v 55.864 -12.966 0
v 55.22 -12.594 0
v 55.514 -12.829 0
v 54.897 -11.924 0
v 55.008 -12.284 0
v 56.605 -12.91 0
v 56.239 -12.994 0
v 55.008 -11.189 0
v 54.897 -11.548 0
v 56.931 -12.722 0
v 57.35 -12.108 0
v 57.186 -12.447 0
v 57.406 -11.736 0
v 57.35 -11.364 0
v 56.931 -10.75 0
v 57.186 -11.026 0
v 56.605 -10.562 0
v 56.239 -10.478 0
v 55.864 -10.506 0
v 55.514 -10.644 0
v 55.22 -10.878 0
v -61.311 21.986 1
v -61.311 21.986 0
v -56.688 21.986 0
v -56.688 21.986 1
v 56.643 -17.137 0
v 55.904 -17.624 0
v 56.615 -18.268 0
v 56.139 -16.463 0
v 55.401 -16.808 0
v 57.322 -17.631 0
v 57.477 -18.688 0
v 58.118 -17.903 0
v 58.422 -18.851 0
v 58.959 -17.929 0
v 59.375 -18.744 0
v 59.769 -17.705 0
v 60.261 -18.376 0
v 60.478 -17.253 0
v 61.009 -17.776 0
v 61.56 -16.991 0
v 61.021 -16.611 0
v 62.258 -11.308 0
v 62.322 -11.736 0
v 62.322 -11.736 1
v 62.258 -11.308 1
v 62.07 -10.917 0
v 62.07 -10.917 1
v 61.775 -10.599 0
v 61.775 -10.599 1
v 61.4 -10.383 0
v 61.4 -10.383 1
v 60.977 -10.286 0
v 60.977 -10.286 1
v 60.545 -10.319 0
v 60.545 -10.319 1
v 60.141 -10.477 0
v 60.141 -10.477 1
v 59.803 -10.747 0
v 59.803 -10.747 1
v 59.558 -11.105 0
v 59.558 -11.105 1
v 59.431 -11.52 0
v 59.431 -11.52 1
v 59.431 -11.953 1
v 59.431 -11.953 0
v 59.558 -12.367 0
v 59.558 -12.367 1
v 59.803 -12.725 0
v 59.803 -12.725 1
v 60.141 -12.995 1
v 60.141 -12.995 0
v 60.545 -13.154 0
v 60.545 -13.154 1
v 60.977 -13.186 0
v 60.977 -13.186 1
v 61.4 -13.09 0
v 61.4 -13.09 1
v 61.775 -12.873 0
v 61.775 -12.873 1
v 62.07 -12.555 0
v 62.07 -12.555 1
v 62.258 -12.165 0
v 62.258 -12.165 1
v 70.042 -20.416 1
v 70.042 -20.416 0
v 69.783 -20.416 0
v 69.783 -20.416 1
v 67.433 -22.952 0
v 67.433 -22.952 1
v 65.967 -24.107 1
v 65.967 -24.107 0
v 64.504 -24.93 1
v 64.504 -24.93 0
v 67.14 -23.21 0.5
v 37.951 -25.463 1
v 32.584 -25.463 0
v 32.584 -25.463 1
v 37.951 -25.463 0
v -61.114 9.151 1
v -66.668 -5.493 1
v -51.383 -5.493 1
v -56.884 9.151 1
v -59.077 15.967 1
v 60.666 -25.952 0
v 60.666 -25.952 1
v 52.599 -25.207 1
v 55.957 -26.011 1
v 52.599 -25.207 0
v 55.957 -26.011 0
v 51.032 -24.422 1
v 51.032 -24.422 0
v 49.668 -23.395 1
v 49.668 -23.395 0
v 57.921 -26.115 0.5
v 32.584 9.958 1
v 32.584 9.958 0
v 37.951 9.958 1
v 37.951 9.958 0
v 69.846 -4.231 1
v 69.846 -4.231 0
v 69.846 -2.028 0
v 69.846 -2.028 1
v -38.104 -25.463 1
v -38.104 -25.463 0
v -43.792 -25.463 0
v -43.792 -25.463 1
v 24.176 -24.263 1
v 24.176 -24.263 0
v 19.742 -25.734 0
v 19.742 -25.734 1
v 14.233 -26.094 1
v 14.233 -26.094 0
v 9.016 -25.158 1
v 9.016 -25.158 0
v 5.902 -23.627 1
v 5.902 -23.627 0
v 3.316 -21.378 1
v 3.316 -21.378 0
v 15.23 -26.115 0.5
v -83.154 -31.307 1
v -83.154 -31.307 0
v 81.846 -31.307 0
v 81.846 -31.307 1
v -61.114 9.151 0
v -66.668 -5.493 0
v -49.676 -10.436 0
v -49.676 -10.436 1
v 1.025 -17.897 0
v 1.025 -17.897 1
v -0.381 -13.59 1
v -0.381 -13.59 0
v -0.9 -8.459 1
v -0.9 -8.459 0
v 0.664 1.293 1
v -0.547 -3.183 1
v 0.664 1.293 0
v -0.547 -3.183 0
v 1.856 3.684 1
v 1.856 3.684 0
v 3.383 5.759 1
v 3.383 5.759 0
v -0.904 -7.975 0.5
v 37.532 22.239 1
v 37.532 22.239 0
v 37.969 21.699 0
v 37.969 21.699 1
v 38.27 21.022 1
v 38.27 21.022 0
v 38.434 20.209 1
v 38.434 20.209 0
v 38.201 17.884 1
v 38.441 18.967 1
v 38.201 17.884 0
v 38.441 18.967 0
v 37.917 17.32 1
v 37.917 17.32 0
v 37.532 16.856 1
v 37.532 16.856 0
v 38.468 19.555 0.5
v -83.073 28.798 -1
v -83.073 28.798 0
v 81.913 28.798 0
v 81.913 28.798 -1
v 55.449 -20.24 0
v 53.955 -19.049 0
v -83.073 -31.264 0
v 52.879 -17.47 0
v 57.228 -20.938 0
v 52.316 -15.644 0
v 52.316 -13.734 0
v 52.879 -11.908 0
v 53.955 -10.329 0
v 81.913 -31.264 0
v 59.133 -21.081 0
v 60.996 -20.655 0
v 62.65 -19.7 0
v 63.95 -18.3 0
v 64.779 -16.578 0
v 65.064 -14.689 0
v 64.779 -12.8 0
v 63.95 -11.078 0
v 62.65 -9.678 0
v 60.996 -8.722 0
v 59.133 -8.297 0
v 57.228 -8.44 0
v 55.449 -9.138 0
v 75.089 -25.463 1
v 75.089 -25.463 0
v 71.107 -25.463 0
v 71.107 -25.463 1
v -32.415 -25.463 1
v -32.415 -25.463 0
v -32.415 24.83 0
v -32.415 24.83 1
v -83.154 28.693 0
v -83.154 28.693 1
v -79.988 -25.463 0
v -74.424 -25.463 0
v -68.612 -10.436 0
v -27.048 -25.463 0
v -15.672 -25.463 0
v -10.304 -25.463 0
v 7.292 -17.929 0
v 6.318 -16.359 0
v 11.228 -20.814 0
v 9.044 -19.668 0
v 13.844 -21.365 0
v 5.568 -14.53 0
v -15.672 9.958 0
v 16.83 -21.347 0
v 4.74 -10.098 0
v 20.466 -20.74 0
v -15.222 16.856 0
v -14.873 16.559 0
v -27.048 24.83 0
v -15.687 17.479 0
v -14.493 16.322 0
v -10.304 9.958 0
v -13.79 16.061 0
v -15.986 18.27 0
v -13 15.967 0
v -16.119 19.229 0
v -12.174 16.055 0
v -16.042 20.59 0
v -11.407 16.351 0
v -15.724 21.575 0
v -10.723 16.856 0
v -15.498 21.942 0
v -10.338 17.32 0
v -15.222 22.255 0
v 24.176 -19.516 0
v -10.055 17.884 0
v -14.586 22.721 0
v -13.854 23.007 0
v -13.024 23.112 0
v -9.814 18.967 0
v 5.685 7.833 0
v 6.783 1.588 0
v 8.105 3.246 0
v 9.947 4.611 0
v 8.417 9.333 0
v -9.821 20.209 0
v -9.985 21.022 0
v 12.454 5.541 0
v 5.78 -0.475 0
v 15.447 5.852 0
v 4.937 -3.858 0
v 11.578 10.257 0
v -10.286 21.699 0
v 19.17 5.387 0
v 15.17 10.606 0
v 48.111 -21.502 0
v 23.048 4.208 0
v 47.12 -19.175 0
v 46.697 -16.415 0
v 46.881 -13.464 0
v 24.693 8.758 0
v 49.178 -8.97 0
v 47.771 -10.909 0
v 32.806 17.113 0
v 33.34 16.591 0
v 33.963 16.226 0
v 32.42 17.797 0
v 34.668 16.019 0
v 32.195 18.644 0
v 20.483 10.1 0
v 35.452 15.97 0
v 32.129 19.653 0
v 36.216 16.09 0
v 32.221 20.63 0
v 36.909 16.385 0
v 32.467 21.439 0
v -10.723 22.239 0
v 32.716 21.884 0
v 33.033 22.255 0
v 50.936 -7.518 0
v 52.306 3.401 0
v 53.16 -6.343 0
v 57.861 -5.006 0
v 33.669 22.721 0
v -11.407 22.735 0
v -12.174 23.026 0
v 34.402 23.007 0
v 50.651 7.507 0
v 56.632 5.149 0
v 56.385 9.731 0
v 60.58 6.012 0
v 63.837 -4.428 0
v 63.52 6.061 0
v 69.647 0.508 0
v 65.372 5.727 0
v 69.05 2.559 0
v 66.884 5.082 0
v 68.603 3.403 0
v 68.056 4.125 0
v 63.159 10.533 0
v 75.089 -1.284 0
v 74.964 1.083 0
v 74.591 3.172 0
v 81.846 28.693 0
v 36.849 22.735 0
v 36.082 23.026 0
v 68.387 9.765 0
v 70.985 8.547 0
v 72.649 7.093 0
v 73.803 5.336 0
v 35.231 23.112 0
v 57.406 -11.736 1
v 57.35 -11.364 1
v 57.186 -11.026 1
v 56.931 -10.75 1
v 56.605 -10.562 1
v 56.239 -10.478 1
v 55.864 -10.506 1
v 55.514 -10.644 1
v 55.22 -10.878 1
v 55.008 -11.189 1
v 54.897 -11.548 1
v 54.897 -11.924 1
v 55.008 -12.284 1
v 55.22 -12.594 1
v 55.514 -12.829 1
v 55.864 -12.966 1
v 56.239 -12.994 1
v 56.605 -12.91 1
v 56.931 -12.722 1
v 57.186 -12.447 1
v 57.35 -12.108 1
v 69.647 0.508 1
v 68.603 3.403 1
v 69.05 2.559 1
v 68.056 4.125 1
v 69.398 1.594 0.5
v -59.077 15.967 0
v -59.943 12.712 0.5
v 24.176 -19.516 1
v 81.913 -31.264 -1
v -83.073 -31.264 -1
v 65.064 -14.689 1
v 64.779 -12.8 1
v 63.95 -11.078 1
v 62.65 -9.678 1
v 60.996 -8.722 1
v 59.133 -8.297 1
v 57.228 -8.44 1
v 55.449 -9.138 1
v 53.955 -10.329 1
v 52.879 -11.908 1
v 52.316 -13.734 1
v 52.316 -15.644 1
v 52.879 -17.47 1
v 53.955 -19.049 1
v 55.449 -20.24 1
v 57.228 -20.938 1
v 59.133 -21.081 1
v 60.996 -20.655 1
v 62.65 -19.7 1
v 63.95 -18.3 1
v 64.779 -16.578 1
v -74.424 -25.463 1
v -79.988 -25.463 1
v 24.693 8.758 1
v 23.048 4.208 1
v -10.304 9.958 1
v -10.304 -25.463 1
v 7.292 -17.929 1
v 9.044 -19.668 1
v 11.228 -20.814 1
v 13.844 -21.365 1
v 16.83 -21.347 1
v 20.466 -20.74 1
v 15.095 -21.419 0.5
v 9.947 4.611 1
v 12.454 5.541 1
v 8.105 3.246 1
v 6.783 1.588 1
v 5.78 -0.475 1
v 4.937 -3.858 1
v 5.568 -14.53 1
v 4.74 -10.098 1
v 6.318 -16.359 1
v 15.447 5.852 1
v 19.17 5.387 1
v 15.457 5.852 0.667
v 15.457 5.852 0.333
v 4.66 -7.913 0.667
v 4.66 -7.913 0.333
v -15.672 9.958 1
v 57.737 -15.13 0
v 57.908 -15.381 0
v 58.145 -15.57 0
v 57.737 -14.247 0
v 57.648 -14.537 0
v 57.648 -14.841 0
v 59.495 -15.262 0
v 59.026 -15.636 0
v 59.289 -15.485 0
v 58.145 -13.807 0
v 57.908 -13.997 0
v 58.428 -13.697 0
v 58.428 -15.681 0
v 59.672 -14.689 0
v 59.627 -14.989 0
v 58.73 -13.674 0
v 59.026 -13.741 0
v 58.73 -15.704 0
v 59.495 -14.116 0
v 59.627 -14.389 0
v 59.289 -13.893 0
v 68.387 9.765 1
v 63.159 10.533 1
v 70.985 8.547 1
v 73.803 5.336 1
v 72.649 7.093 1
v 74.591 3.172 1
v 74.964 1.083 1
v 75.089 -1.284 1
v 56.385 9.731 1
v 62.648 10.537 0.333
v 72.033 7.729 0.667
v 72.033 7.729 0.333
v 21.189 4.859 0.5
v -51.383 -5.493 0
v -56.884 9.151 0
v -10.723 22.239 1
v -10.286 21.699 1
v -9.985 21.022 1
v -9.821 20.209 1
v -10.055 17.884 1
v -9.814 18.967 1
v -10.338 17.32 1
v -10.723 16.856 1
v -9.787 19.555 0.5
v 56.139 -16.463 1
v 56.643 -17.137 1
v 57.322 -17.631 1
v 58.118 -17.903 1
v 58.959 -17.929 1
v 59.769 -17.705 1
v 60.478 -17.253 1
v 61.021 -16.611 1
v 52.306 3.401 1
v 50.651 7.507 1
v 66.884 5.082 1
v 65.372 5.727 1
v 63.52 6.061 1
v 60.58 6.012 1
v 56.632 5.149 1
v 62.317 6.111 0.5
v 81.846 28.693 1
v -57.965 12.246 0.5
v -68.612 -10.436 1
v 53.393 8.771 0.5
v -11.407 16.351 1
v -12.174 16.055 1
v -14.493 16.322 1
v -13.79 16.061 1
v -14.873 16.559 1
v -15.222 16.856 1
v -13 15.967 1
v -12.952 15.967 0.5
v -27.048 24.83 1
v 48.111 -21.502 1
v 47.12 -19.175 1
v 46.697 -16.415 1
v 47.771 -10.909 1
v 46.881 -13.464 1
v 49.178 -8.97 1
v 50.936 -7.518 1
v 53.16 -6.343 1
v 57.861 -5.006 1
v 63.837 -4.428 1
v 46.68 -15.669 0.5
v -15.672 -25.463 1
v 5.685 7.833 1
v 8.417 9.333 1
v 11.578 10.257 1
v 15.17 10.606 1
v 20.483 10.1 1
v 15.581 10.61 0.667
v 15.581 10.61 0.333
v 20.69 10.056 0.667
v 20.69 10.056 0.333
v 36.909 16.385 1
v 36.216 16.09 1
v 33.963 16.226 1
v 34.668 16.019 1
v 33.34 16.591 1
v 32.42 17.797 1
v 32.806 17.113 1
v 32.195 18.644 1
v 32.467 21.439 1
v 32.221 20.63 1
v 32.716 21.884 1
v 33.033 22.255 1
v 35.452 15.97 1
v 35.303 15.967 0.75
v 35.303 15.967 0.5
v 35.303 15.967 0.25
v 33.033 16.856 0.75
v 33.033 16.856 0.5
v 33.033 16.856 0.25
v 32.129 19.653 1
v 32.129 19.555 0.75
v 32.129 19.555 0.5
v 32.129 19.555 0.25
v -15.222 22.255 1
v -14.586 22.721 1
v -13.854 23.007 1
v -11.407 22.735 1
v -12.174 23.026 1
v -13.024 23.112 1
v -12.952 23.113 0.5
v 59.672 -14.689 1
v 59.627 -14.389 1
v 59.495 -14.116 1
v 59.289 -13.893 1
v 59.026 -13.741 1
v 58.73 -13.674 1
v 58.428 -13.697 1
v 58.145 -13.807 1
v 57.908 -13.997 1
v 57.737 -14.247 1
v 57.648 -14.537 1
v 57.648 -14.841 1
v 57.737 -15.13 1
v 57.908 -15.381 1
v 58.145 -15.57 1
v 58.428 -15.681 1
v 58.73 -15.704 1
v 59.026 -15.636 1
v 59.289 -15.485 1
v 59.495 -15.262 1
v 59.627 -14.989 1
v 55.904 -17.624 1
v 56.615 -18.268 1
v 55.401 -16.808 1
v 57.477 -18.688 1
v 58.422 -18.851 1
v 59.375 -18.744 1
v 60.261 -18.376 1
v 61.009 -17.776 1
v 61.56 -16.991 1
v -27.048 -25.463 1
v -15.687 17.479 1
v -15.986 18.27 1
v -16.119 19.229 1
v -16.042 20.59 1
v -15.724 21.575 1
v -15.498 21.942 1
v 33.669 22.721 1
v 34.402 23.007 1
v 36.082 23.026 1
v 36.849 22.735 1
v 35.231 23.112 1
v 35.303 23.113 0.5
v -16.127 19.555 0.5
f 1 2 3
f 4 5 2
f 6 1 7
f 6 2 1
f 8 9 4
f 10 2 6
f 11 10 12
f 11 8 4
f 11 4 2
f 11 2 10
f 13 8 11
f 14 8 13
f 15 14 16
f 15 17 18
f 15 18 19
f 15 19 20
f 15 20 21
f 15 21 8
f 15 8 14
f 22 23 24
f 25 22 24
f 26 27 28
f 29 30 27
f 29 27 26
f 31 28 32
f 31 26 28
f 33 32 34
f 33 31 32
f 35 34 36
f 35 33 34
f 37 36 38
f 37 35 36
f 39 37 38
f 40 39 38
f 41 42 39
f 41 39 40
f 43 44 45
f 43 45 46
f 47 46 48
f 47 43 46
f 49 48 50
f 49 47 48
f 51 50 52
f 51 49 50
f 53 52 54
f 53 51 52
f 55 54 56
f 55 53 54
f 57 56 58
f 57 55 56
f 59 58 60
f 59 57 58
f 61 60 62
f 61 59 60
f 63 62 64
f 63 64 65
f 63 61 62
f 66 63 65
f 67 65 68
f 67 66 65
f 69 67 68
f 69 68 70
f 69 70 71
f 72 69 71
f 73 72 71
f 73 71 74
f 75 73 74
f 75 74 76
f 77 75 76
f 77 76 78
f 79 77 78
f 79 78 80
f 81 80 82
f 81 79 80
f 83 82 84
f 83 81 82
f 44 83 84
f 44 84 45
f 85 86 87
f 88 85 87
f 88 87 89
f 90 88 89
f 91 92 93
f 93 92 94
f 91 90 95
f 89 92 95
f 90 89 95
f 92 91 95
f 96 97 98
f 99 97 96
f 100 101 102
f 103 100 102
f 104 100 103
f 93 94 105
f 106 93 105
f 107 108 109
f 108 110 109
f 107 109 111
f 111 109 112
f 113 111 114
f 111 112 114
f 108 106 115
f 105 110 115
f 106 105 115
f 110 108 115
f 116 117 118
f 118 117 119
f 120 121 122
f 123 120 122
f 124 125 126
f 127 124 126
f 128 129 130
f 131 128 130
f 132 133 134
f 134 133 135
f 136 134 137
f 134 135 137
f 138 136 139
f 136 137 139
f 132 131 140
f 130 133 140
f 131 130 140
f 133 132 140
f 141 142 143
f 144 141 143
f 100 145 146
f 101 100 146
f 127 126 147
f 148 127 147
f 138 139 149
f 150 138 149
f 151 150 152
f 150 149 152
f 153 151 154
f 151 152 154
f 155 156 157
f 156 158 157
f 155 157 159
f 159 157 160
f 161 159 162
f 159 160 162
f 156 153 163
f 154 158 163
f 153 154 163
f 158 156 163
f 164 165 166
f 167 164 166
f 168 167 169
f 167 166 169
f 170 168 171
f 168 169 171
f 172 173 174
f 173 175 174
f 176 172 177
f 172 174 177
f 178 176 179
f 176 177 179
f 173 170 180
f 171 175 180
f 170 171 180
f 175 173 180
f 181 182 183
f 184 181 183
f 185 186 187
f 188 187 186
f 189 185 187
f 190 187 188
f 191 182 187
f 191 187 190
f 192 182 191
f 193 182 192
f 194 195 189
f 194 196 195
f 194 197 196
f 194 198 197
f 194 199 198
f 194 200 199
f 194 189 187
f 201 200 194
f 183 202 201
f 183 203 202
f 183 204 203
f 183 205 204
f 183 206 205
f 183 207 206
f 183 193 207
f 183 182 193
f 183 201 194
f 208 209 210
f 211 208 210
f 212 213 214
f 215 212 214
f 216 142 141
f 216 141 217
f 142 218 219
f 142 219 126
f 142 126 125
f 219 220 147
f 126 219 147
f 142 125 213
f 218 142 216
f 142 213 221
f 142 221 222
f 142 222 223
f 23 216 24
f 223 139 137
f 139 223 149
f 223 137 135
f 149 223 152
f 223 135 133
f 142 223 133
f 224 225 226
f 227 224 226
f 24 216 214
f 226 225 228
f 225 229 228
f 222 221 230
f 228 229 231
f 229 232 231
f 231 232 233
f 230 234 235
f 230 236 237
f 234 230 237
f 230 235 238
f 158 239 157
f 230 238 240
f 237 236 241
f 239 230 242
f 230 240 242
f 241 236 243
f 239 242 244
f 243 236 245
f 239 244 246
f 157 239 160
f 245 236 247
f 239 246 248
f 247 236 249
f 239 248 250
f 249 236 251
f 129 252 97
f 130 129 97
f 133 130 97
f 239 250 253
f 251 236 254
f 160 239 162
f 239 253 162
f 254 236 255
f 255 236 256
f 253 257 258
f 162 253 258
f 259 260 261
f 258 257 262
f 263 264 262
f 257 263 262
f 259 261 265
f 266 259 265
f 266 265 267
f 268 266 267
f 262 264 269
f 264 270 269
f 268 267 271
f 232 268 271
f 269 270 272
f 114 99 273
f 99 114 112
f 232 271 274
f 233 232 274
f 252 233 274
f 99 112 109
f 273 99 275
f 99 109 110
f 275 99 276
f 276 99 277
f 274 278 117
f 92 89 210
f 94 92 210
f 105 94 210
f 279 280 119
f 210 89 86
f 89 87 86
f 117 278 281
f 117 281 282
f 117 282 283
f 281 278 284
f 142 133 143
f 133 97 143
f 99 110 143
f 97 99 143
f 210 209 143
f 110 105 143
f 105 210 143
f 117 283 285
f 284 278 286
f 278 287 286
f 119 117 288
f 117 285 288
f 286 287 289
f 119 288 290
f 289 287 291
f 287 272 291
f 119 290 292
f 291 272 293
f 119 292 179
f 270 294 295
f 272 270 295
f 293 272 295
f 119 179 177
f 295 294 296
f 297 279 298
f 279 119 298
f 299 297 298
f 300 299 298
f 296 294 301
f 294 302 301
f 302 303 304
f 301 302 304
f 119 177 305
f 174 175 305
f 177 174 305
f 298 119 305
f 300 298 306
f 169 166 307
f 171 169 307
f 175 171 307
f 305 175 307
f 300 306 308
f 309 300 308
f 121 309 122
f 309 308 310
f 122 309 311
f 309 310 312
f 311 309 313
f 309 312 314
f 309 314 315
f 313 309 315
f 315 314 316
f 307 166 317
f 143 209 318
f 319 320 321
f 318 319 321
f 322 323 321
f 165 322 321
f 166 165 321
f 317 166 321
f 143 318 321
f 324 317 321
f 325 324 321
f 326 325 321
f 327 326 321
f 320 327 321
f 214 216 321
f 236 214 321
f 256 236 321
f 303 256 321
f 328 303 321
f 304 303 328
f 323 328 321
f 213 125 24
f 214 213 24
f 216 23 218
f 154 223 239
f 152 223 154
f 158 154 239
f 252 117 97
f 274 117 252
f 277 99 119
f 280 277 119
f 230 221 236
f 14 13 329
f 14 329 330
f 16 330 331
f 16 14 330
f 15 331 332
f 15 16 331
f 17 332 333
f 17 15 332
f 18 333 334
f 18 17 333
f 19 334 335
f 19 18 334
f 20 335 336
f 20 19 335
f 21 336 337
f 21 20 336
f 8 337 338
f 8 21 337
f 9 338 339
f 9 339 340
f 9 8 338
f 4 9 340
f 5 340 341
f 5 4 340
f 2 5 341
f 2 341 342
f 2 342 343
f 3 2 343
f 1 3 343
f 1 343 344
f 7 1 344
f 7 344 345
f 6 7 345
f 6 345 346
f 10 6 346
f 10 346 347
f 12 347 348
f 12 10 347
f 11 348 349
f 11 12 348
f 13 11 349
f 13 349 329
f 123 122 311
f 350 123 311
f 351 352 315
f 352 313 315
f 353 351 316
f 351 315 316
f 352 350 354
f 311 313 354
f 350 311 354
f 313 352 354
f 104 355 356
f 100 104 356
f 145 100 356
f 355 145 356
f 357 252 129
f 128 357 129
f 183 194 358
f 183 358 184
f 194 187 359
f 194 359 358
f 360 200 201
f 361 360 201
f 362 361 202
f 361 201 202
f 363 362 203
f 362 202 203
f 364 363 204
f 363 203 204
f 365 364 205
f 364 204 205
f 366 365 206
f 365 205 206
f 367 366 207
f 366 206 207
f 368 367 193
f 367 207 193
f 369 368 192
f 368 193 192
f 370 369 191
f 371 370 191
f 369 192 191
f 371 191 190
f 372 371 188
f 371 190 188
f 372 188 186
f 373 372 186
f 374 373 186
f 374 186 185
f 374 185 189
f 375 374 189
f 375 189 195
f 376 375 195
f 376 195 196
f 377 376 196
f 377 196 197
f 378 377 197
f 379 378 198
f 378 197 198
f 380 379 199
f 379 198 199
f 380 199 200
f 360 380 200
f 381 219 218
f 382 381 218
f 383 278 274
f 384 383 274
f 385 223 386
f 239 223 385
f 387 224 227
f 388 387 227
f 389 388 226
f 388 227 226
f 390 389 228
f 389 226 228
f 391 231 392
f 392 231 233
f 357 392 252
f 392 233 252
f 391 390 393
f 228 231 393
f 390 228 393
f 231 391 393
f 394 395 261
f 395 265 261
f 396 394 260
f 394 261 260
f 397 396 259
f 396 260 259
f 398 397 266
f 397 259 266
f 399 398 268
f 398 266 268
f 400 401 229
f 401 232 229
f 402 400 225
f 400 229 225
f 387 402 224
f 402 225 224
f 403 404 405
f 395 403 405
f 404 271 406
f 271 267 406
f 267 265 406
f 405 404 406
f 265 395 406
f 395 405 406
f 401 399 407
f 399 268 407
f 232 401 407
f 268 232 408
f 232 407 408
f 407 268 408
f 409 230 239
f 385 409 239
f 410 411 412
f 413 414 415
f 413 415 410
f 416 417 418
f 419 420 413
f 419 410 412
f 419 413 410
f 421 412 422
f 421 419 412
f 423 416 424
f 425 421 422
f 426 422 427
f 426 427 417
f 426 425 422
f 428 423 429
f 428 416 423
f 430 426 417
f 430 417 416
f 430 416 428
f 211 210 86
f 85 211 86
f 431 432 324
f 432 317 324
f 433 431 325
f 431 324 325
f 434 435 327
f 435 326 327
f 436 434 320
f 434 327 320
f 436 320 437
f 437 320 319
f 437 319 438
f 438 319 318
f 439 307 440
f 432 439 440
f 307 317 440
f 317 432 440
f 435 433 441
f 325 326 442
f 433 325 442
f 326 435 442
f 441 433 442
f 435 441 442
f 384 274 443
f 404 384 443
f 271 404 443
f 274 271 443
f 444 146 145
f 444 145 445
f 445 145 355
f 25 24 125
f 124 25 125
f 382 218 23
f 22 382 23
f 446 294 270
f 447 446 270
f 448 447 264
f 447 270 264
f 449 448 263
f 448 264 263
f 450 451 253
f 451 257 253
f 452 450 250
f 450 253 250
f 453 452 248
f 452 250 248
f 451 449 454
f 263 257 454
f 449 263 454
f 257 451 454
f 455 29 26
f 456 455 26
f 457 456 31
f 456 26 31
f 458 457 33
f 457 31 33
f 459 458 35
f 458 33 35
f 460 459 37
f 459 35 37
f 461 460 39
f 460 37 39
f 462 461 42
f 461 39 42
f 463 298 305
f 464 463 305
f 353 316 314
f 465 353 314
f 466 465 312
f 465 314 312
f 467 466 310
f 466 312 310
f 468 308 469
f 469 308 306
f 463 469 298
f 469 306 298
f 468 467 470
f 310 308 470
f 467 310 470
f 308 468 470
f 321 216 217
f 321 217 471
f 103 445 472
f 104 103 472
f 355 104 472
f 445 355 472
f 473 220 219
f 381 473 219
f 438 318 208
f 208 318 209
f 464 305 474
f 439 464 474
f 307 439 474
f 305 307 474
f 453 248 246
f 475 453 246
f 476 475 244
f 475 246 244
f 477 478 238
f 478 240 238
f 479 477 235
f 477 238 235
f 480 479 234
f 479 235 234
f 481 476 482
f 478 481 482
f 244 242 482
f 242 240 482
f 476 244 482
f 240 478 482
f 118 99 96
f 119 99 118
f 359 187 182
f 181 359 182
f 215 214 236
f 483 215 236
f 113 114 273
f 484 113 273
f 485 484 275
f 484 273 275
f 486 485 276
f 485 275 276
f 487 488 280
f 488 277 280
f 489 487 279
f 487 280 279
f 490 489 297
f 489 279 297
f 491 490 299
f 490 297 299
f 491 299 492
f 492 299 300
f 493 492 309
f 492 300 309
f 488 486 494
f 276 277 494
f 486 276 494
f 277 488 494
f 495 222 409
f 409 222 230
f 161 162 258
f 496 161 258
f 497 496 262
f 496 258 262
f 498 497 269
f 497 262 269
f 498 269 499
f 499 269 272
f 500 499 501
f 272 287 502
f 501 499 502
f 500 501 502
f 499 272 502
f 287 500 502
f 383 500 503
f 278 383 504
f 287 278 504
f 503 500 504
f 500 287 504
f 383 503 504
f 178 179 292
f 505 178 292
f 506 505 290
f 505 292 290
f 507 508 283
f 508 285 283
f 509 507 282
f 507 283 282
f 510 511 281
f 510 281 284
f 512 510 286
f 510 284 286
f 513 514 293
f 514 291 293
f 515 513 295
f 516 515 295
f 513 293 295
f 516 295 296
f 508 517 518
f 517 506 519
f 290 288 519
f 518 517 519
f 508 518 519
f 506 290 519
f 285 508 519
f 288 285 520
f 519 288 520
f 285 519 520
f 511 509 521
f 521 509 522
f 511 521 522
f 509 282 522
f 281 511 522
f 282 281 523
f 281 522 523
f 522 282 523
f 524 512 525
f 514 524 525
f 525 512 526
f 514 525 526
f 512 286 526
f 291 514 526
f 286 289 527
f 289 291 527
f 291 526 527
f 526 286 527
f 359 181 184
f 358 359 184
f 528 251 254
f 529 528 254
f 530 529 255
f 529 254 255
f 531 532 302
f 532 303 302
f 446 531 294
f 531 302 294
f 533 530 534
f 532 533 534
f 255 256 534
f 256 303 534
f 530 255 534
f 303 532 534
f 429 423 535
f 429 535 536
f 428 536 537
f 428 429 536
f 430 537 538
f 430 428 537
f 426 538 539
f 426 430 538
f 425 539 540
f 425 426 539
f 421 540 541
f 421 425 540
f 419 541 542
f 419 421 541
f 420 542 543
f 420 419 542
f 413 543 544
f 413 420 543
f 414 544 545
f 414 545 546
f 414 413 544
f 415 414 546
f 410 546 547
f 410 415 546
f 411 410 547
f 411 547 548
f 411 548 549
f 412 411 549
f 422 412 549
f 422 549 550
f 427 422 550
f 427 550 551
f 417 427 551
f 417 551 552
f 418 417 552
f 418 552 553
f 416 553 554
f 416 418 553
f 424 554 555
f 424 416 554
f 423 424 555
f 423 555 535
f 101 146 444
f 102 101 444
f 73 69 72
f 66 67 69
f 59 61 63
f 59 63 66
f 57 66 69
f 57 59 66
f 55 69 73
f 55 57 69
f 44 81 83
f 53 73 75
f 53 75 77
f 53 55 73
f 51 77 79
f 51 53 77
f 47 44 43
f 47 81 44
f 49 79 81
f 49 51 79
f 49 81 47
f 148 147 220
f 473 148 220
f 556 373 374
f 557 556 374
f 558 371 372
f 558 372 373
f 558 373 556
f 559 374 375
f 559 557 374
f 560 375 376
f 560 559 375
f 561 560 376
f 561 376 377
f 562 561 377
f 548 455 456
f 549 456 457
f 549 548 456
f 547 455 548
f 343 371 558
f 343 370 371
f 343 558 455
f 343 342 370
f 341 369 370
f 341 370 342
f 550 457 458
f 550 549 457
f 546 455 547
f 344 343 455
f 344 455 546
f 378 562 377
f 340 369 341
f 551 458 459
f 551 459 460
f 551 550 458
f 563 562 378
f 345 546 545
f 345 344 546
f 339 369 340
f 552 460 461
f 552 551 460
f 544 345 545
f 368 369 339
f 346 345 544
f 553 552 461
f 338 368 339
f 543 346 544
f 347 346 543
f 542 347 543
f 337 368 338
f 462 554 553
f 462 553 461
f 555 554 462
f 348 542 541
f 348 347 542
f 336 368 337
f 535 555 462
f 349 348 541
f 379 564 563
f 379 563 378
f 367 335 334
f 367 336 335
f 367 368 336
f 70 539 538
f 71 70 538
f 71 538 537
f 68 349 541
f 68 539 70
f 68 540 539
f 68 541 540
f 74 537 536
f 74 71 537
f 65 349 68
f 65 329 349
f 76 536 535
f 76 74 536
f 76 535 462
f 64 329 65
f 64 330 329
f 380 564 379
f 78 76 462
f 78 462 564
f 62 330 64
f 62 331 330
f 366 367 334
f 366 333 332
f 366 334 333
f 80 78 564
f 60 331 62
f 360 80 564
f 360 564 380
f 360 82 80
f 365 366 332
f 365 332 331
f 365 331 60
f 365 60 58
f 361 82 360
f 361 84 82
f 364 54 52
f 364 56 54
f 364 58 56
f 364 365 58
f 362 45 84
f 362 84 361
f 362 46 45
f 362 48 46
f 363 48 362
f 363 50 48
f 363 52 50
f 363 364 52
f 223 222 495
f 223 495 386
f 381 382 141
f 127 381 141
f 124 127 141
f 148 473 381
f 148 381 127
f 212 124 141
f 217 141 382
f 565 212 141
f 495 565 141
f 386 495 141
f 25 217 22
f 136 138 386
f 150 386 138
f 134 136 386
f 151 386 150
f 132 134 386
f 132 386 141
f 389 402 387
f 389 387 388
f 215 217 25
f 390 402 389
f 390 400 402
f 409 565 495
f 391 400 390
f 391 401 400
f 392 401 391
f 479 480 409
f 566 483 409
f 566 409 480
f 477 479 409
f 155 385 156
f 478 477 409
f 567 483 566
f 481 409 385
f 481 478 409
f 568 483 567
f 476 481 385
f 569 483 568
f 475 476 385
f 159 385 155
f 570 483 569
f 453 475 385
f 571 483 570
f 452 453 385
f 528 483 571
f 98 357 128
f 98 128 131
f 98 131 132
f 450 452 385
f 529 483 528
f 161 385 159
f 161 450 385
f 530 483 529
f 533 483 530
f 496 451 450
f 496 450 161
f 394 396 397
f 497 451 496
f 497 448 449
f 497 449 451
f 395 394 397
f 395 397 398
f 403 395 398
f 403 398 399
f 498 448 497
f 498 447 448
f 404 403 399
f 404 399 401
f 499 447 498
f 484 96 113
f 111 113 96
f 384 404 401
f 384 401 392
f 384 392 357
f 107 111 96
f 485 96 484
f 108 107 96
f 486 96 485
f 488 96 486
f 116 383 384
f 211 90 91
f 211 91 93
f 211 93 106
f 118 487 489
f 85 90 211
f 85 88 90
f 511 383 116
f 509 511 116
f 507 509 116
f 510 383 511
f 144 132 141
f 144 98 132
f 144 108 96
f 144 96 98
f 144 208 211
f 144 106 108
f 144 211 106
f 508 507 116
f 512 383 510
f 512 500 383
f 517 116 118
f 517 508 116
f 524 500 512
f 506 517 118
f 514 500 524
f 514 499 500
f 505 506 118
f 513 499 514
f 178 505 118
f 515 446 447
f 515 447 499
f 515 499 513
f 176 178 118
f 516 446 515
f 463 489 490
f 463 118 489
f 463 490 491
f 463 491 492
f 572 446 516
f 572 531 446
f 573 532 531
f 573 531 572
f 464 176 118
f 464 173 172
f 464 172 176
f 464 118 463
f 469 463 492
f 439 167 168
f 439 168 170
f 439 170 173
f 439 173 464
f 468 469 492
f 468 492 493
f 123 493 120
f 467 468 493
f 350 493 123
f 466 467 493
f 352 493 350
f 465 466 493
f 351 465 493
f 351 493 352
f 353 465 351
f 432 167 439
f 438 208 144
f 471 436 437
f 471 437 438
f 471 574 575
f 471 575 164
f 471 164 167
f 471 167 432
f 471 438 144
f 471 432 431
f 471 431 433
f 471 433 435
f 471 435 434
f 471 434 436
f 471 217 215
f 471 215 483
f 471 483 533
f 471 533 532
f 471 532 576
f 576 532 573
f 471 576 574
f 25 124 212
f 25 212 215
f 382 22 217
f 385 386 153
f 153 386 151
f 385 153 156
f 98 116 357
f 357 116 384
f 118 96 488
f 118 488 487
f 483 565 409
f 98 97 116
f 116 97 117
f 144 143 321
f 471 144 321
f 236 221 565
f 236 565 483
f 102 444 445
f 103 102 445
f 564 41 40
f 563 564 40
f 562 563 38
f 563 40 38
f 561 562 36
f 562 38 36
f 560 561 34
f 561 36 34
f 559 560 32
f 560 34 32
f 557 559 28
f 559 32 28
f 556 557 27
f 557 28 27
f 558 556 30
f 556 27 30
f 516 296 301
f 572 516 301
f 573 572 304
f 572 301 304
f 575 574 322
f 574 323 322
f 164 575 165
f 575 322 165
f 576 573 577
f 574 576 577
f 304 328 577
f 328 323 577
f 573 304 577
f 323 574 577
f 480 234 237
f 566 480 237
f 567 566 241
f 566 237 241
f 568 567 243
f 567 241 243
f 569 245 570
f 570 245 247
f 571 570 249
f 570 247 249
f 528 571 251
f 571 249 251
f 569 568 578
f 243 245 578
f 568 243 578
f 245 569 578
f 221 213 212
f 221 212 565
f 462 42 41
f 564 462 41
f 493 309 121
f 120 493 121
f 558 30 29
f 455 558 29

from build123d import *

# Parameters (mm, degrees)
F0_W     = 165
F0_H     = 60
F0_W_2   = 5.3674592261
F0_H_2   = 35.4210941219
F0_H_3   = 50.2927826904
F1_DEPTH = 1
F2_W     = 164.9859398603
F2_H     = 60.061968863
F3_DEPTH = 1
F4_R     = 6.409683708
F4_R_2   = 1.2613707954
F4_R_3   = 1.0177752813
F4_R_4   = 1.454007205
F5_DEPTH = 1


with BuildPart() as f1:
    # F0 (on Top) → F1 (new body)
    with BuildSketch(Plane.XY):
        with Locations((-0.6536817551, -1.306731385)):
            Rectangle(F0_W, F0_H)
        Polygon((-38.1035080281, -25.4630388226), (-43.7915669382, -25.4630388226), (-49.6761224288, -10.4362213747), (-68.6121876368, -10.4362213747), (-74.4243496503, -25.4630388226), (-79.9883054569, -25.4630388226), (-61.3107883813, 21.9857144127), (-56.6879477762, 21.9857144127), align=None, mode=Mode.SUBTRACT)
        with Locations((-12.9881424588, -7.7524917617)):
            Rectangle(F0_W_2, F0_H_2, mode=Mode.SUBTRACT)
        with BuildLine():
            add(Edge.make_bspline(
                [(24.1755660746, -24.2633754889), (20.6282856998, -26.114580116), (15.2298006979, -26.114580116)],
                knots=[0, 0, 0, 1, 1, 1], degree=2))
            add(Edge.make_bspline(
                [(15.2298006979, -26.114580116), (7.5354082813, -26.114580116), (3.3159027626, -21.3779783327)],
                knots=[0, 0, 0, 1, 1, 1], degree=2))
            add(Edge.make_bspline(
                [(3.3159027626, -21.3779783327), (-0.9036027562, -16.6413765494), (-0.9036027562, -7.9748431555)],
                knots=[0, 0, 0, 1, 1, 1], degree=2))
            add(Edge.make_bspline(
                [(-0.9036027562, -7.9748431555), (-0.9036027562, 0.9088706696), (3.3831252769, 5.7592336311)],
                knots=[0, 0, 0, 1, 1, 1], degree=2))
            add(Edge.make_bspline(
                [(3.3831252769, 5.7592336311), (7.6698533101, 10.6095965926), (15.5814261577, 10.6095965926)],
                knots=[0, 0, 0, 1, 1, 1], degree=2))
            add(Edge.make_bspline(
                [(15.5814261577, 10.6095965926), (18.1358817046, 10.6095965926), (20.6903372515, 10.0563035895)],
                knots=[0, 0, 0, 1, 1, 1], degree=2))
            add(Edge.make_bspline(
                [(20.6903372515, 10.0563035895), (23.2447927984, 9.5030105864), (24.6926623392, 8.7583919655)],
                knots=[0, 0, 0, 1, 1, 1], degree=2))
            Line((24.6926623392, 8.7583919655), (23.0482962179, 4.2079448374))
            add(Edge.make_bspline(
                [(23.0482962179, 4.2079448374), (21.2694850678, 4.9215376825), (19.1700742337, 5.3869243206)],
                knots=[0, 0, 0, 1, 1, 1], degree=2))
            add(Edge.make_bspline(
                [(19.1700742337, 5.3869243206), (17.0706633997, 5.8523109587), (15.4573230543, 5.8523109587)],
                knots=[0, 0, 0, 1, 1, 1], degree=2))
            add(Edge.make_bspline(
                [(15.4573230543, 5.8523109587), (4.6603530504, 5.8523109587), (4.6603530504, -7.9127916037)],
                knots=[0, 0, 0, 1, 1, 1], degree=2))
            add(Edge.make_bspline(
                [(4.6603530504, -7.9127916037), (4.6603530504, -14.4385464624), (7.292373037, -17.9289462481)],
                knots=[0, 0, 0, 1, 1, 1], degree=2))
            add(Edge.make_bspline(
                [(7.292373037, -17.9289462481), (9.9243930235, -21.4193460338), (15.0953556691, -21.4193460338)],
                knots=[0, 0, 0, 1, 1, 1], degree=2))
            add(Edge.make_bspline(
                [(15.0953556691, -21.4193460338), (19.5216996936, -21.4193460338), (24.1755660746, -19.5164317803)],
                knots=[0, 0, 0, 1, 1, 1], degree=2))
            Line((24.1755660746, -19.5164317803), (24.1755660746, -24.2633754889))
        make_face(mode=Mode.SUBTRACT)
        with Locations((35.2672809493, -7.7524917617)):
            Rectangle(F0_W_2, F0_H_2, mode=Mode.SUBTRACT)
        with BuildLine():
            Line((75.0888642825, -25.4630388226), (71.1072230454, -25.4630388226))
            Line((71.1072230454, -25.4630388226), (70.0420047405, -20.4161792806))
            Line((70.0420047405, -20.4161792806), (69.7834566082, -20.4161792806))
            add(Edge.make_bspline(
                [(69.7834566082, -20.4161792806), (67.1359237337, -23.7462792243), (64.5039037471, -24.9304296701)],
                knots=[0, 0, 0, 1, 1, 1], degree=2))
            add(Edge.make_bspline(
                [(64.5039037471, -24.9304296701), (61.8718837605, -26.114580116), (57.9212682993, -26.114580116)],
                knots=[0, 0, 0, 1, 1, 1], degree=2))
            add(Edge.make_bspline(
                [(57.9212682993, -26.114580116), (52.6572283262, -26.114580116), (49.6684119171, -23.3946537644)],
                knots=[0, 0, 0, 1, 1, 1], degree=2))
            add(Edge.make_bspline(
                [(49.6684119171, -23.3946537644), (46.679595508, -20.6747274129), (46.679595508, -15.669235572)],
                knots=[0, 0, 0, 1, 1, 1], degree=2))
            add(Edge.make_bspline(
                [(46.679595508, -15.669235572), (46.679595508, -4.9446590452), (63.8368495658, -4.4275627806)],
                knots=[0, 0, 0, 1, 1, 1], degree=2))
            Line((63.8368495658, -4.4275627806), (69.8455081599, -4.2310662001))
            Line((69.8455081599, -4.2310662001), (69.8455081599, -2.0282361131))
            add(Edge.make_bspline(
                [(69.8455081599, -2.0282361131), (69.8455081599, 2.1395597792), (68.0563550846, 4.1252094351)],
                knots=[0, 0, 0, 1, 1, 1], degree=2))
            add(Edge.make_bspline(
                [(68.0563550846, 4.1252094351), (66.2672020092, 6.110859091), (62.316586548, 6.110859091)],
                knots=[0, 0, 0, 1, 1, 1], degree=2))
            add(Edge.make_bspline(
                [(62.316586548, 6.110859091), (57.8902425235, 6.110859091), (52.3056028663, 3.4012746647)],
                knots=[0, 0, 0, 1, 1, 1], degree=2))
            Line((52.3056028663, 3.4012746647), (50.6508948197, 7.5070190053))
            add(Edge.make_bspline(
                [(50.6508948197, 7.5070190053), (53.2674019184, 8.9238627701), (56.3854923936, 9.7305329428)],
                knots=[0, 0, 0, 1, 1, 1], degree=2))
            add(Edge.make_bspline(
                [(56.3854923936, 9.7305329428), (59.5035828689, 10.5372031155), (62.6475281574, 10.5372031155)],
                knots=[0, 0, 0, 1, 1, 1], degree=2))
            add(Edge.make_bspline(
                [(62.6475281574, 10.5372031155), (68.9767864355, 10.5372031155), (72.032825359, 7.729370399)],
                knots=[0, 0, 0, 1, 1, 1], degree=2))
            add(Edge.make_bspline(
                [(72.032825359, 7.729370399), (75.0888642825, 4.9215376825), (75.0888642825, -1.2836174921)],
                knots=[0, 0, 0, 1, 1, 1], degree=2))
            Line((75.0888642825, -1.2836174921), (75.0888642825, -25.4630388226))
        make_face(mode=Mode.SUBTRACT)
        with Locations((-29.731719505, -0.3166474774)):
            Rectangle(F0_W_2, F0_H_3, mode=Mode.SUBTRACT)
        with BuildLine():
            add(Edge.make_bspline(
                [(-15.2219983217, 16.8561194684), (-16.1269167846, 17.7455250434), (-16.1269167846, 19.5553619693)],
                knots=[0, 0, 0, 1, 1, 1], degree=2))
            add(Edge.make_bspline(
                [(-16.1269167846, 19.5553619693), (-16.1269167846, 21.3962246712), (-15.2219983217, 22.2546044703)],
                knots=[0, 0, 0, 1, 1, 1], degree=2))
            add(Edge.make_bspline(
                [(-15.2219983217, 22.2546044703), (-14.3170798587, 23.1129842695), (-12.9519457203, 23.1129842695)],
                knots=[0, 0, 0, 1, 1, 1], degree=2))
            add(Edge.make_bspline(
                [(-12.9519457203, 23.1129842695), (-11.6592050589, 23.1129842695), (-10.7232608201, 22.2390915824)],
                knots=[0, 0, 0, 1, 1, 1], degree=2))
            add(Edge.make_bspline(
                [(-10.7232608201, 22.2390915824), (-9.7873165812, 21.3651988953), (-9.7873165812, 19.5553619693)],
                knots=[0, 0, 0, 1, 1, 1], degree=2))
            add(Edge.make_bspline(
                [(-9.7873165812, 19.5553619693), (-9.7873165812, 17.7455250434), (-10.7232608201, 16.8561194684)],
                knots=[0, 0, 0, 1, 1, 1], degree=2))
            add(Edge.make_bspline(
                [(-10.7232608201, 16.8561194684), (-11.6592050589, 15.9667138934), (-12.9519457203, 15.9667138934)],
                knots=[0, 0, 0, 1, 1, 1], degree=2))
            add(Edge.make_bspline(
                [(-12.9519457203, 15.9667138934), (-14.3170798587, 15.9667138934), (-15.2219983217, 16.8561194684)],
                knots=[0, 0, 0, 1, 1, 1], degree=2))
        make_face(mode=Mode.SUBTRACT)
        with BuildLine():
            add(Edge.make_bspline(
                [(33.0334250864, 16.8561194684), (32.1285066234, 17.7455250434), (32.1285066234, 19.5553619693)],
                knots=[0, 0, 0, 1, 1, 1], degree=2))
            add(Edge.make_bspline(
                [(32.1285066234, 19.5553619693), (32.1285066234, 21.3962246712), (33.0334250864, 22.2546044703)],
                knots=[0, 0, 0, 1, 1, 1], degree=2))
            add(Edge.make_bspline(
                [(33.0334250864, 22.2546044703), (33.9383435494, 23.1129842695), (35.3034776878, 23.1129842695)],
                knots=[0, 0, 0, 1, 1, 1], degree=2))
            add(Edge.make_bspline(
                [(35.3034776878, 23.1129842695), (36.5962183492, 23.1129842695), (37.532162588, 22.2390915824)],
                knots=[0, 0, 0, 1, 1, 1], degree=2))
            add(Edge.make_bspline(
                [(37.532162588, 22.2390915824), (38.4681068269, 21.3651988953), (38.4681068269, 19.5553619693)],
                knots=[0, 0, 0, 1, 1, 1], degree=2))
            add(Edge.make_bspline(
                [(38.4681068269, 19.5553619693), (38.4681068269, 17.7455250434), (37.532162588, 16.8561194684)],
                knots=[0, 0, 0, 1, 1, 1], degree=2))
            add(Edge.make_bspline(
                [(37.532162588, 16.8561194684), (36.5962183492, 15.9667138934), (35.3034776878, 15.9667138934)],
                knots=[0, 0, 0, 1, 1, 1], degree=2))
            add(Edge.make_bspline(
                [(35.3034776878, 15.9667138934), (33.9383435494, 15.9667138934), (33.0334250864, 16.8561194684)],
                knots=[0, 0, 0, 1, 1, 1], degree=2))
        make_face(mode=Mode.SUBTRACT)
    extrude(amount=F1_DEPTH)


with BuildPart() as f1b:
    # F0 (on Top) → F1, piece 2 (new body)
    with BuildSketch(Plane.XY):
        with BuildLine():
            Line((-66.6679056821, -5.4927810856), (-51.3825401019, -5.4927810856))
            Line((-51.3825401019, -5.4927810856), (-56.8844443567, 9.1513851265))
            add(Edge.make_bspline(
                [(-56.8844443567, 9.1513851265), (-57.9496626617, 11.9333630298), (-59.0769325184, 15.9667138934)],
                knots=[0, 0, 0, 1, 1, 1], degree=2))
            add(Edge.make_bspline(
                [(-59.0769325184, 15.9667138934), (-59.7905253635, 12.864136306), (-61.1142918008, 9.1513851265)],
                knots=[0, 0, 0, 1, 1, 1], degree=2))
            Line((-61.1142918008, 9.1513851265), (-66.6679056821, -5.4927810856))
        make_face()
    extrude(amount=F1_DEPTH)


with BuildPart() as f3:
    # F2 (on Top) → F3 (new body)
    with BuildSketch(Plane.XY):
        with Locations((-0.579893589, -1.2329444289)):
            Rectangle(F2_W, F2_H)
    extrude(amount=-F3_DEPTH)

    # F4 (on Top) → F5 (join)
    with BuildSketch(Plane.XY):
        with Locations((58.6539879441, -14.6888671443)):
            Circle(F4_R)
        with BuildLine():
            Line((55.4006919265, -16.8080963194), (56.1387794259, -16.463384994))
            ThreePointArc((56.1387794259, -16.463384994), (58.5373394084, -17.9477110273), (61.0213756043, -16.6113435853))
            Line((61.0213756043, -16.6113435853), (61.5598000586, -16.9907808304))
            ThreePointArc((61.5598000586, -16.9907808304), (58.4223745304, -18.8505431924), (55.4006919265, -16.8080963194))
        make_face(mode=Mode.SUBTRACT)
        with Locations((56.1442412436, -11.7362253368)):
            Circle(F4_R_2, mode=Mode.SUBTRACT)
        with Locations((58.6539879441, -14.6888671443)):
            Circle(F4_R_3, mode=Mode.SUBTRACT)
        with Locations((60.8684681356, -11.7362253368)):
            Circle(F4_R_4, mode=Mode.SUBTRACT)
    extrude(amount=F5_DEPTH)


solid = Compound([f1.part, f1b.part, f3.part])
